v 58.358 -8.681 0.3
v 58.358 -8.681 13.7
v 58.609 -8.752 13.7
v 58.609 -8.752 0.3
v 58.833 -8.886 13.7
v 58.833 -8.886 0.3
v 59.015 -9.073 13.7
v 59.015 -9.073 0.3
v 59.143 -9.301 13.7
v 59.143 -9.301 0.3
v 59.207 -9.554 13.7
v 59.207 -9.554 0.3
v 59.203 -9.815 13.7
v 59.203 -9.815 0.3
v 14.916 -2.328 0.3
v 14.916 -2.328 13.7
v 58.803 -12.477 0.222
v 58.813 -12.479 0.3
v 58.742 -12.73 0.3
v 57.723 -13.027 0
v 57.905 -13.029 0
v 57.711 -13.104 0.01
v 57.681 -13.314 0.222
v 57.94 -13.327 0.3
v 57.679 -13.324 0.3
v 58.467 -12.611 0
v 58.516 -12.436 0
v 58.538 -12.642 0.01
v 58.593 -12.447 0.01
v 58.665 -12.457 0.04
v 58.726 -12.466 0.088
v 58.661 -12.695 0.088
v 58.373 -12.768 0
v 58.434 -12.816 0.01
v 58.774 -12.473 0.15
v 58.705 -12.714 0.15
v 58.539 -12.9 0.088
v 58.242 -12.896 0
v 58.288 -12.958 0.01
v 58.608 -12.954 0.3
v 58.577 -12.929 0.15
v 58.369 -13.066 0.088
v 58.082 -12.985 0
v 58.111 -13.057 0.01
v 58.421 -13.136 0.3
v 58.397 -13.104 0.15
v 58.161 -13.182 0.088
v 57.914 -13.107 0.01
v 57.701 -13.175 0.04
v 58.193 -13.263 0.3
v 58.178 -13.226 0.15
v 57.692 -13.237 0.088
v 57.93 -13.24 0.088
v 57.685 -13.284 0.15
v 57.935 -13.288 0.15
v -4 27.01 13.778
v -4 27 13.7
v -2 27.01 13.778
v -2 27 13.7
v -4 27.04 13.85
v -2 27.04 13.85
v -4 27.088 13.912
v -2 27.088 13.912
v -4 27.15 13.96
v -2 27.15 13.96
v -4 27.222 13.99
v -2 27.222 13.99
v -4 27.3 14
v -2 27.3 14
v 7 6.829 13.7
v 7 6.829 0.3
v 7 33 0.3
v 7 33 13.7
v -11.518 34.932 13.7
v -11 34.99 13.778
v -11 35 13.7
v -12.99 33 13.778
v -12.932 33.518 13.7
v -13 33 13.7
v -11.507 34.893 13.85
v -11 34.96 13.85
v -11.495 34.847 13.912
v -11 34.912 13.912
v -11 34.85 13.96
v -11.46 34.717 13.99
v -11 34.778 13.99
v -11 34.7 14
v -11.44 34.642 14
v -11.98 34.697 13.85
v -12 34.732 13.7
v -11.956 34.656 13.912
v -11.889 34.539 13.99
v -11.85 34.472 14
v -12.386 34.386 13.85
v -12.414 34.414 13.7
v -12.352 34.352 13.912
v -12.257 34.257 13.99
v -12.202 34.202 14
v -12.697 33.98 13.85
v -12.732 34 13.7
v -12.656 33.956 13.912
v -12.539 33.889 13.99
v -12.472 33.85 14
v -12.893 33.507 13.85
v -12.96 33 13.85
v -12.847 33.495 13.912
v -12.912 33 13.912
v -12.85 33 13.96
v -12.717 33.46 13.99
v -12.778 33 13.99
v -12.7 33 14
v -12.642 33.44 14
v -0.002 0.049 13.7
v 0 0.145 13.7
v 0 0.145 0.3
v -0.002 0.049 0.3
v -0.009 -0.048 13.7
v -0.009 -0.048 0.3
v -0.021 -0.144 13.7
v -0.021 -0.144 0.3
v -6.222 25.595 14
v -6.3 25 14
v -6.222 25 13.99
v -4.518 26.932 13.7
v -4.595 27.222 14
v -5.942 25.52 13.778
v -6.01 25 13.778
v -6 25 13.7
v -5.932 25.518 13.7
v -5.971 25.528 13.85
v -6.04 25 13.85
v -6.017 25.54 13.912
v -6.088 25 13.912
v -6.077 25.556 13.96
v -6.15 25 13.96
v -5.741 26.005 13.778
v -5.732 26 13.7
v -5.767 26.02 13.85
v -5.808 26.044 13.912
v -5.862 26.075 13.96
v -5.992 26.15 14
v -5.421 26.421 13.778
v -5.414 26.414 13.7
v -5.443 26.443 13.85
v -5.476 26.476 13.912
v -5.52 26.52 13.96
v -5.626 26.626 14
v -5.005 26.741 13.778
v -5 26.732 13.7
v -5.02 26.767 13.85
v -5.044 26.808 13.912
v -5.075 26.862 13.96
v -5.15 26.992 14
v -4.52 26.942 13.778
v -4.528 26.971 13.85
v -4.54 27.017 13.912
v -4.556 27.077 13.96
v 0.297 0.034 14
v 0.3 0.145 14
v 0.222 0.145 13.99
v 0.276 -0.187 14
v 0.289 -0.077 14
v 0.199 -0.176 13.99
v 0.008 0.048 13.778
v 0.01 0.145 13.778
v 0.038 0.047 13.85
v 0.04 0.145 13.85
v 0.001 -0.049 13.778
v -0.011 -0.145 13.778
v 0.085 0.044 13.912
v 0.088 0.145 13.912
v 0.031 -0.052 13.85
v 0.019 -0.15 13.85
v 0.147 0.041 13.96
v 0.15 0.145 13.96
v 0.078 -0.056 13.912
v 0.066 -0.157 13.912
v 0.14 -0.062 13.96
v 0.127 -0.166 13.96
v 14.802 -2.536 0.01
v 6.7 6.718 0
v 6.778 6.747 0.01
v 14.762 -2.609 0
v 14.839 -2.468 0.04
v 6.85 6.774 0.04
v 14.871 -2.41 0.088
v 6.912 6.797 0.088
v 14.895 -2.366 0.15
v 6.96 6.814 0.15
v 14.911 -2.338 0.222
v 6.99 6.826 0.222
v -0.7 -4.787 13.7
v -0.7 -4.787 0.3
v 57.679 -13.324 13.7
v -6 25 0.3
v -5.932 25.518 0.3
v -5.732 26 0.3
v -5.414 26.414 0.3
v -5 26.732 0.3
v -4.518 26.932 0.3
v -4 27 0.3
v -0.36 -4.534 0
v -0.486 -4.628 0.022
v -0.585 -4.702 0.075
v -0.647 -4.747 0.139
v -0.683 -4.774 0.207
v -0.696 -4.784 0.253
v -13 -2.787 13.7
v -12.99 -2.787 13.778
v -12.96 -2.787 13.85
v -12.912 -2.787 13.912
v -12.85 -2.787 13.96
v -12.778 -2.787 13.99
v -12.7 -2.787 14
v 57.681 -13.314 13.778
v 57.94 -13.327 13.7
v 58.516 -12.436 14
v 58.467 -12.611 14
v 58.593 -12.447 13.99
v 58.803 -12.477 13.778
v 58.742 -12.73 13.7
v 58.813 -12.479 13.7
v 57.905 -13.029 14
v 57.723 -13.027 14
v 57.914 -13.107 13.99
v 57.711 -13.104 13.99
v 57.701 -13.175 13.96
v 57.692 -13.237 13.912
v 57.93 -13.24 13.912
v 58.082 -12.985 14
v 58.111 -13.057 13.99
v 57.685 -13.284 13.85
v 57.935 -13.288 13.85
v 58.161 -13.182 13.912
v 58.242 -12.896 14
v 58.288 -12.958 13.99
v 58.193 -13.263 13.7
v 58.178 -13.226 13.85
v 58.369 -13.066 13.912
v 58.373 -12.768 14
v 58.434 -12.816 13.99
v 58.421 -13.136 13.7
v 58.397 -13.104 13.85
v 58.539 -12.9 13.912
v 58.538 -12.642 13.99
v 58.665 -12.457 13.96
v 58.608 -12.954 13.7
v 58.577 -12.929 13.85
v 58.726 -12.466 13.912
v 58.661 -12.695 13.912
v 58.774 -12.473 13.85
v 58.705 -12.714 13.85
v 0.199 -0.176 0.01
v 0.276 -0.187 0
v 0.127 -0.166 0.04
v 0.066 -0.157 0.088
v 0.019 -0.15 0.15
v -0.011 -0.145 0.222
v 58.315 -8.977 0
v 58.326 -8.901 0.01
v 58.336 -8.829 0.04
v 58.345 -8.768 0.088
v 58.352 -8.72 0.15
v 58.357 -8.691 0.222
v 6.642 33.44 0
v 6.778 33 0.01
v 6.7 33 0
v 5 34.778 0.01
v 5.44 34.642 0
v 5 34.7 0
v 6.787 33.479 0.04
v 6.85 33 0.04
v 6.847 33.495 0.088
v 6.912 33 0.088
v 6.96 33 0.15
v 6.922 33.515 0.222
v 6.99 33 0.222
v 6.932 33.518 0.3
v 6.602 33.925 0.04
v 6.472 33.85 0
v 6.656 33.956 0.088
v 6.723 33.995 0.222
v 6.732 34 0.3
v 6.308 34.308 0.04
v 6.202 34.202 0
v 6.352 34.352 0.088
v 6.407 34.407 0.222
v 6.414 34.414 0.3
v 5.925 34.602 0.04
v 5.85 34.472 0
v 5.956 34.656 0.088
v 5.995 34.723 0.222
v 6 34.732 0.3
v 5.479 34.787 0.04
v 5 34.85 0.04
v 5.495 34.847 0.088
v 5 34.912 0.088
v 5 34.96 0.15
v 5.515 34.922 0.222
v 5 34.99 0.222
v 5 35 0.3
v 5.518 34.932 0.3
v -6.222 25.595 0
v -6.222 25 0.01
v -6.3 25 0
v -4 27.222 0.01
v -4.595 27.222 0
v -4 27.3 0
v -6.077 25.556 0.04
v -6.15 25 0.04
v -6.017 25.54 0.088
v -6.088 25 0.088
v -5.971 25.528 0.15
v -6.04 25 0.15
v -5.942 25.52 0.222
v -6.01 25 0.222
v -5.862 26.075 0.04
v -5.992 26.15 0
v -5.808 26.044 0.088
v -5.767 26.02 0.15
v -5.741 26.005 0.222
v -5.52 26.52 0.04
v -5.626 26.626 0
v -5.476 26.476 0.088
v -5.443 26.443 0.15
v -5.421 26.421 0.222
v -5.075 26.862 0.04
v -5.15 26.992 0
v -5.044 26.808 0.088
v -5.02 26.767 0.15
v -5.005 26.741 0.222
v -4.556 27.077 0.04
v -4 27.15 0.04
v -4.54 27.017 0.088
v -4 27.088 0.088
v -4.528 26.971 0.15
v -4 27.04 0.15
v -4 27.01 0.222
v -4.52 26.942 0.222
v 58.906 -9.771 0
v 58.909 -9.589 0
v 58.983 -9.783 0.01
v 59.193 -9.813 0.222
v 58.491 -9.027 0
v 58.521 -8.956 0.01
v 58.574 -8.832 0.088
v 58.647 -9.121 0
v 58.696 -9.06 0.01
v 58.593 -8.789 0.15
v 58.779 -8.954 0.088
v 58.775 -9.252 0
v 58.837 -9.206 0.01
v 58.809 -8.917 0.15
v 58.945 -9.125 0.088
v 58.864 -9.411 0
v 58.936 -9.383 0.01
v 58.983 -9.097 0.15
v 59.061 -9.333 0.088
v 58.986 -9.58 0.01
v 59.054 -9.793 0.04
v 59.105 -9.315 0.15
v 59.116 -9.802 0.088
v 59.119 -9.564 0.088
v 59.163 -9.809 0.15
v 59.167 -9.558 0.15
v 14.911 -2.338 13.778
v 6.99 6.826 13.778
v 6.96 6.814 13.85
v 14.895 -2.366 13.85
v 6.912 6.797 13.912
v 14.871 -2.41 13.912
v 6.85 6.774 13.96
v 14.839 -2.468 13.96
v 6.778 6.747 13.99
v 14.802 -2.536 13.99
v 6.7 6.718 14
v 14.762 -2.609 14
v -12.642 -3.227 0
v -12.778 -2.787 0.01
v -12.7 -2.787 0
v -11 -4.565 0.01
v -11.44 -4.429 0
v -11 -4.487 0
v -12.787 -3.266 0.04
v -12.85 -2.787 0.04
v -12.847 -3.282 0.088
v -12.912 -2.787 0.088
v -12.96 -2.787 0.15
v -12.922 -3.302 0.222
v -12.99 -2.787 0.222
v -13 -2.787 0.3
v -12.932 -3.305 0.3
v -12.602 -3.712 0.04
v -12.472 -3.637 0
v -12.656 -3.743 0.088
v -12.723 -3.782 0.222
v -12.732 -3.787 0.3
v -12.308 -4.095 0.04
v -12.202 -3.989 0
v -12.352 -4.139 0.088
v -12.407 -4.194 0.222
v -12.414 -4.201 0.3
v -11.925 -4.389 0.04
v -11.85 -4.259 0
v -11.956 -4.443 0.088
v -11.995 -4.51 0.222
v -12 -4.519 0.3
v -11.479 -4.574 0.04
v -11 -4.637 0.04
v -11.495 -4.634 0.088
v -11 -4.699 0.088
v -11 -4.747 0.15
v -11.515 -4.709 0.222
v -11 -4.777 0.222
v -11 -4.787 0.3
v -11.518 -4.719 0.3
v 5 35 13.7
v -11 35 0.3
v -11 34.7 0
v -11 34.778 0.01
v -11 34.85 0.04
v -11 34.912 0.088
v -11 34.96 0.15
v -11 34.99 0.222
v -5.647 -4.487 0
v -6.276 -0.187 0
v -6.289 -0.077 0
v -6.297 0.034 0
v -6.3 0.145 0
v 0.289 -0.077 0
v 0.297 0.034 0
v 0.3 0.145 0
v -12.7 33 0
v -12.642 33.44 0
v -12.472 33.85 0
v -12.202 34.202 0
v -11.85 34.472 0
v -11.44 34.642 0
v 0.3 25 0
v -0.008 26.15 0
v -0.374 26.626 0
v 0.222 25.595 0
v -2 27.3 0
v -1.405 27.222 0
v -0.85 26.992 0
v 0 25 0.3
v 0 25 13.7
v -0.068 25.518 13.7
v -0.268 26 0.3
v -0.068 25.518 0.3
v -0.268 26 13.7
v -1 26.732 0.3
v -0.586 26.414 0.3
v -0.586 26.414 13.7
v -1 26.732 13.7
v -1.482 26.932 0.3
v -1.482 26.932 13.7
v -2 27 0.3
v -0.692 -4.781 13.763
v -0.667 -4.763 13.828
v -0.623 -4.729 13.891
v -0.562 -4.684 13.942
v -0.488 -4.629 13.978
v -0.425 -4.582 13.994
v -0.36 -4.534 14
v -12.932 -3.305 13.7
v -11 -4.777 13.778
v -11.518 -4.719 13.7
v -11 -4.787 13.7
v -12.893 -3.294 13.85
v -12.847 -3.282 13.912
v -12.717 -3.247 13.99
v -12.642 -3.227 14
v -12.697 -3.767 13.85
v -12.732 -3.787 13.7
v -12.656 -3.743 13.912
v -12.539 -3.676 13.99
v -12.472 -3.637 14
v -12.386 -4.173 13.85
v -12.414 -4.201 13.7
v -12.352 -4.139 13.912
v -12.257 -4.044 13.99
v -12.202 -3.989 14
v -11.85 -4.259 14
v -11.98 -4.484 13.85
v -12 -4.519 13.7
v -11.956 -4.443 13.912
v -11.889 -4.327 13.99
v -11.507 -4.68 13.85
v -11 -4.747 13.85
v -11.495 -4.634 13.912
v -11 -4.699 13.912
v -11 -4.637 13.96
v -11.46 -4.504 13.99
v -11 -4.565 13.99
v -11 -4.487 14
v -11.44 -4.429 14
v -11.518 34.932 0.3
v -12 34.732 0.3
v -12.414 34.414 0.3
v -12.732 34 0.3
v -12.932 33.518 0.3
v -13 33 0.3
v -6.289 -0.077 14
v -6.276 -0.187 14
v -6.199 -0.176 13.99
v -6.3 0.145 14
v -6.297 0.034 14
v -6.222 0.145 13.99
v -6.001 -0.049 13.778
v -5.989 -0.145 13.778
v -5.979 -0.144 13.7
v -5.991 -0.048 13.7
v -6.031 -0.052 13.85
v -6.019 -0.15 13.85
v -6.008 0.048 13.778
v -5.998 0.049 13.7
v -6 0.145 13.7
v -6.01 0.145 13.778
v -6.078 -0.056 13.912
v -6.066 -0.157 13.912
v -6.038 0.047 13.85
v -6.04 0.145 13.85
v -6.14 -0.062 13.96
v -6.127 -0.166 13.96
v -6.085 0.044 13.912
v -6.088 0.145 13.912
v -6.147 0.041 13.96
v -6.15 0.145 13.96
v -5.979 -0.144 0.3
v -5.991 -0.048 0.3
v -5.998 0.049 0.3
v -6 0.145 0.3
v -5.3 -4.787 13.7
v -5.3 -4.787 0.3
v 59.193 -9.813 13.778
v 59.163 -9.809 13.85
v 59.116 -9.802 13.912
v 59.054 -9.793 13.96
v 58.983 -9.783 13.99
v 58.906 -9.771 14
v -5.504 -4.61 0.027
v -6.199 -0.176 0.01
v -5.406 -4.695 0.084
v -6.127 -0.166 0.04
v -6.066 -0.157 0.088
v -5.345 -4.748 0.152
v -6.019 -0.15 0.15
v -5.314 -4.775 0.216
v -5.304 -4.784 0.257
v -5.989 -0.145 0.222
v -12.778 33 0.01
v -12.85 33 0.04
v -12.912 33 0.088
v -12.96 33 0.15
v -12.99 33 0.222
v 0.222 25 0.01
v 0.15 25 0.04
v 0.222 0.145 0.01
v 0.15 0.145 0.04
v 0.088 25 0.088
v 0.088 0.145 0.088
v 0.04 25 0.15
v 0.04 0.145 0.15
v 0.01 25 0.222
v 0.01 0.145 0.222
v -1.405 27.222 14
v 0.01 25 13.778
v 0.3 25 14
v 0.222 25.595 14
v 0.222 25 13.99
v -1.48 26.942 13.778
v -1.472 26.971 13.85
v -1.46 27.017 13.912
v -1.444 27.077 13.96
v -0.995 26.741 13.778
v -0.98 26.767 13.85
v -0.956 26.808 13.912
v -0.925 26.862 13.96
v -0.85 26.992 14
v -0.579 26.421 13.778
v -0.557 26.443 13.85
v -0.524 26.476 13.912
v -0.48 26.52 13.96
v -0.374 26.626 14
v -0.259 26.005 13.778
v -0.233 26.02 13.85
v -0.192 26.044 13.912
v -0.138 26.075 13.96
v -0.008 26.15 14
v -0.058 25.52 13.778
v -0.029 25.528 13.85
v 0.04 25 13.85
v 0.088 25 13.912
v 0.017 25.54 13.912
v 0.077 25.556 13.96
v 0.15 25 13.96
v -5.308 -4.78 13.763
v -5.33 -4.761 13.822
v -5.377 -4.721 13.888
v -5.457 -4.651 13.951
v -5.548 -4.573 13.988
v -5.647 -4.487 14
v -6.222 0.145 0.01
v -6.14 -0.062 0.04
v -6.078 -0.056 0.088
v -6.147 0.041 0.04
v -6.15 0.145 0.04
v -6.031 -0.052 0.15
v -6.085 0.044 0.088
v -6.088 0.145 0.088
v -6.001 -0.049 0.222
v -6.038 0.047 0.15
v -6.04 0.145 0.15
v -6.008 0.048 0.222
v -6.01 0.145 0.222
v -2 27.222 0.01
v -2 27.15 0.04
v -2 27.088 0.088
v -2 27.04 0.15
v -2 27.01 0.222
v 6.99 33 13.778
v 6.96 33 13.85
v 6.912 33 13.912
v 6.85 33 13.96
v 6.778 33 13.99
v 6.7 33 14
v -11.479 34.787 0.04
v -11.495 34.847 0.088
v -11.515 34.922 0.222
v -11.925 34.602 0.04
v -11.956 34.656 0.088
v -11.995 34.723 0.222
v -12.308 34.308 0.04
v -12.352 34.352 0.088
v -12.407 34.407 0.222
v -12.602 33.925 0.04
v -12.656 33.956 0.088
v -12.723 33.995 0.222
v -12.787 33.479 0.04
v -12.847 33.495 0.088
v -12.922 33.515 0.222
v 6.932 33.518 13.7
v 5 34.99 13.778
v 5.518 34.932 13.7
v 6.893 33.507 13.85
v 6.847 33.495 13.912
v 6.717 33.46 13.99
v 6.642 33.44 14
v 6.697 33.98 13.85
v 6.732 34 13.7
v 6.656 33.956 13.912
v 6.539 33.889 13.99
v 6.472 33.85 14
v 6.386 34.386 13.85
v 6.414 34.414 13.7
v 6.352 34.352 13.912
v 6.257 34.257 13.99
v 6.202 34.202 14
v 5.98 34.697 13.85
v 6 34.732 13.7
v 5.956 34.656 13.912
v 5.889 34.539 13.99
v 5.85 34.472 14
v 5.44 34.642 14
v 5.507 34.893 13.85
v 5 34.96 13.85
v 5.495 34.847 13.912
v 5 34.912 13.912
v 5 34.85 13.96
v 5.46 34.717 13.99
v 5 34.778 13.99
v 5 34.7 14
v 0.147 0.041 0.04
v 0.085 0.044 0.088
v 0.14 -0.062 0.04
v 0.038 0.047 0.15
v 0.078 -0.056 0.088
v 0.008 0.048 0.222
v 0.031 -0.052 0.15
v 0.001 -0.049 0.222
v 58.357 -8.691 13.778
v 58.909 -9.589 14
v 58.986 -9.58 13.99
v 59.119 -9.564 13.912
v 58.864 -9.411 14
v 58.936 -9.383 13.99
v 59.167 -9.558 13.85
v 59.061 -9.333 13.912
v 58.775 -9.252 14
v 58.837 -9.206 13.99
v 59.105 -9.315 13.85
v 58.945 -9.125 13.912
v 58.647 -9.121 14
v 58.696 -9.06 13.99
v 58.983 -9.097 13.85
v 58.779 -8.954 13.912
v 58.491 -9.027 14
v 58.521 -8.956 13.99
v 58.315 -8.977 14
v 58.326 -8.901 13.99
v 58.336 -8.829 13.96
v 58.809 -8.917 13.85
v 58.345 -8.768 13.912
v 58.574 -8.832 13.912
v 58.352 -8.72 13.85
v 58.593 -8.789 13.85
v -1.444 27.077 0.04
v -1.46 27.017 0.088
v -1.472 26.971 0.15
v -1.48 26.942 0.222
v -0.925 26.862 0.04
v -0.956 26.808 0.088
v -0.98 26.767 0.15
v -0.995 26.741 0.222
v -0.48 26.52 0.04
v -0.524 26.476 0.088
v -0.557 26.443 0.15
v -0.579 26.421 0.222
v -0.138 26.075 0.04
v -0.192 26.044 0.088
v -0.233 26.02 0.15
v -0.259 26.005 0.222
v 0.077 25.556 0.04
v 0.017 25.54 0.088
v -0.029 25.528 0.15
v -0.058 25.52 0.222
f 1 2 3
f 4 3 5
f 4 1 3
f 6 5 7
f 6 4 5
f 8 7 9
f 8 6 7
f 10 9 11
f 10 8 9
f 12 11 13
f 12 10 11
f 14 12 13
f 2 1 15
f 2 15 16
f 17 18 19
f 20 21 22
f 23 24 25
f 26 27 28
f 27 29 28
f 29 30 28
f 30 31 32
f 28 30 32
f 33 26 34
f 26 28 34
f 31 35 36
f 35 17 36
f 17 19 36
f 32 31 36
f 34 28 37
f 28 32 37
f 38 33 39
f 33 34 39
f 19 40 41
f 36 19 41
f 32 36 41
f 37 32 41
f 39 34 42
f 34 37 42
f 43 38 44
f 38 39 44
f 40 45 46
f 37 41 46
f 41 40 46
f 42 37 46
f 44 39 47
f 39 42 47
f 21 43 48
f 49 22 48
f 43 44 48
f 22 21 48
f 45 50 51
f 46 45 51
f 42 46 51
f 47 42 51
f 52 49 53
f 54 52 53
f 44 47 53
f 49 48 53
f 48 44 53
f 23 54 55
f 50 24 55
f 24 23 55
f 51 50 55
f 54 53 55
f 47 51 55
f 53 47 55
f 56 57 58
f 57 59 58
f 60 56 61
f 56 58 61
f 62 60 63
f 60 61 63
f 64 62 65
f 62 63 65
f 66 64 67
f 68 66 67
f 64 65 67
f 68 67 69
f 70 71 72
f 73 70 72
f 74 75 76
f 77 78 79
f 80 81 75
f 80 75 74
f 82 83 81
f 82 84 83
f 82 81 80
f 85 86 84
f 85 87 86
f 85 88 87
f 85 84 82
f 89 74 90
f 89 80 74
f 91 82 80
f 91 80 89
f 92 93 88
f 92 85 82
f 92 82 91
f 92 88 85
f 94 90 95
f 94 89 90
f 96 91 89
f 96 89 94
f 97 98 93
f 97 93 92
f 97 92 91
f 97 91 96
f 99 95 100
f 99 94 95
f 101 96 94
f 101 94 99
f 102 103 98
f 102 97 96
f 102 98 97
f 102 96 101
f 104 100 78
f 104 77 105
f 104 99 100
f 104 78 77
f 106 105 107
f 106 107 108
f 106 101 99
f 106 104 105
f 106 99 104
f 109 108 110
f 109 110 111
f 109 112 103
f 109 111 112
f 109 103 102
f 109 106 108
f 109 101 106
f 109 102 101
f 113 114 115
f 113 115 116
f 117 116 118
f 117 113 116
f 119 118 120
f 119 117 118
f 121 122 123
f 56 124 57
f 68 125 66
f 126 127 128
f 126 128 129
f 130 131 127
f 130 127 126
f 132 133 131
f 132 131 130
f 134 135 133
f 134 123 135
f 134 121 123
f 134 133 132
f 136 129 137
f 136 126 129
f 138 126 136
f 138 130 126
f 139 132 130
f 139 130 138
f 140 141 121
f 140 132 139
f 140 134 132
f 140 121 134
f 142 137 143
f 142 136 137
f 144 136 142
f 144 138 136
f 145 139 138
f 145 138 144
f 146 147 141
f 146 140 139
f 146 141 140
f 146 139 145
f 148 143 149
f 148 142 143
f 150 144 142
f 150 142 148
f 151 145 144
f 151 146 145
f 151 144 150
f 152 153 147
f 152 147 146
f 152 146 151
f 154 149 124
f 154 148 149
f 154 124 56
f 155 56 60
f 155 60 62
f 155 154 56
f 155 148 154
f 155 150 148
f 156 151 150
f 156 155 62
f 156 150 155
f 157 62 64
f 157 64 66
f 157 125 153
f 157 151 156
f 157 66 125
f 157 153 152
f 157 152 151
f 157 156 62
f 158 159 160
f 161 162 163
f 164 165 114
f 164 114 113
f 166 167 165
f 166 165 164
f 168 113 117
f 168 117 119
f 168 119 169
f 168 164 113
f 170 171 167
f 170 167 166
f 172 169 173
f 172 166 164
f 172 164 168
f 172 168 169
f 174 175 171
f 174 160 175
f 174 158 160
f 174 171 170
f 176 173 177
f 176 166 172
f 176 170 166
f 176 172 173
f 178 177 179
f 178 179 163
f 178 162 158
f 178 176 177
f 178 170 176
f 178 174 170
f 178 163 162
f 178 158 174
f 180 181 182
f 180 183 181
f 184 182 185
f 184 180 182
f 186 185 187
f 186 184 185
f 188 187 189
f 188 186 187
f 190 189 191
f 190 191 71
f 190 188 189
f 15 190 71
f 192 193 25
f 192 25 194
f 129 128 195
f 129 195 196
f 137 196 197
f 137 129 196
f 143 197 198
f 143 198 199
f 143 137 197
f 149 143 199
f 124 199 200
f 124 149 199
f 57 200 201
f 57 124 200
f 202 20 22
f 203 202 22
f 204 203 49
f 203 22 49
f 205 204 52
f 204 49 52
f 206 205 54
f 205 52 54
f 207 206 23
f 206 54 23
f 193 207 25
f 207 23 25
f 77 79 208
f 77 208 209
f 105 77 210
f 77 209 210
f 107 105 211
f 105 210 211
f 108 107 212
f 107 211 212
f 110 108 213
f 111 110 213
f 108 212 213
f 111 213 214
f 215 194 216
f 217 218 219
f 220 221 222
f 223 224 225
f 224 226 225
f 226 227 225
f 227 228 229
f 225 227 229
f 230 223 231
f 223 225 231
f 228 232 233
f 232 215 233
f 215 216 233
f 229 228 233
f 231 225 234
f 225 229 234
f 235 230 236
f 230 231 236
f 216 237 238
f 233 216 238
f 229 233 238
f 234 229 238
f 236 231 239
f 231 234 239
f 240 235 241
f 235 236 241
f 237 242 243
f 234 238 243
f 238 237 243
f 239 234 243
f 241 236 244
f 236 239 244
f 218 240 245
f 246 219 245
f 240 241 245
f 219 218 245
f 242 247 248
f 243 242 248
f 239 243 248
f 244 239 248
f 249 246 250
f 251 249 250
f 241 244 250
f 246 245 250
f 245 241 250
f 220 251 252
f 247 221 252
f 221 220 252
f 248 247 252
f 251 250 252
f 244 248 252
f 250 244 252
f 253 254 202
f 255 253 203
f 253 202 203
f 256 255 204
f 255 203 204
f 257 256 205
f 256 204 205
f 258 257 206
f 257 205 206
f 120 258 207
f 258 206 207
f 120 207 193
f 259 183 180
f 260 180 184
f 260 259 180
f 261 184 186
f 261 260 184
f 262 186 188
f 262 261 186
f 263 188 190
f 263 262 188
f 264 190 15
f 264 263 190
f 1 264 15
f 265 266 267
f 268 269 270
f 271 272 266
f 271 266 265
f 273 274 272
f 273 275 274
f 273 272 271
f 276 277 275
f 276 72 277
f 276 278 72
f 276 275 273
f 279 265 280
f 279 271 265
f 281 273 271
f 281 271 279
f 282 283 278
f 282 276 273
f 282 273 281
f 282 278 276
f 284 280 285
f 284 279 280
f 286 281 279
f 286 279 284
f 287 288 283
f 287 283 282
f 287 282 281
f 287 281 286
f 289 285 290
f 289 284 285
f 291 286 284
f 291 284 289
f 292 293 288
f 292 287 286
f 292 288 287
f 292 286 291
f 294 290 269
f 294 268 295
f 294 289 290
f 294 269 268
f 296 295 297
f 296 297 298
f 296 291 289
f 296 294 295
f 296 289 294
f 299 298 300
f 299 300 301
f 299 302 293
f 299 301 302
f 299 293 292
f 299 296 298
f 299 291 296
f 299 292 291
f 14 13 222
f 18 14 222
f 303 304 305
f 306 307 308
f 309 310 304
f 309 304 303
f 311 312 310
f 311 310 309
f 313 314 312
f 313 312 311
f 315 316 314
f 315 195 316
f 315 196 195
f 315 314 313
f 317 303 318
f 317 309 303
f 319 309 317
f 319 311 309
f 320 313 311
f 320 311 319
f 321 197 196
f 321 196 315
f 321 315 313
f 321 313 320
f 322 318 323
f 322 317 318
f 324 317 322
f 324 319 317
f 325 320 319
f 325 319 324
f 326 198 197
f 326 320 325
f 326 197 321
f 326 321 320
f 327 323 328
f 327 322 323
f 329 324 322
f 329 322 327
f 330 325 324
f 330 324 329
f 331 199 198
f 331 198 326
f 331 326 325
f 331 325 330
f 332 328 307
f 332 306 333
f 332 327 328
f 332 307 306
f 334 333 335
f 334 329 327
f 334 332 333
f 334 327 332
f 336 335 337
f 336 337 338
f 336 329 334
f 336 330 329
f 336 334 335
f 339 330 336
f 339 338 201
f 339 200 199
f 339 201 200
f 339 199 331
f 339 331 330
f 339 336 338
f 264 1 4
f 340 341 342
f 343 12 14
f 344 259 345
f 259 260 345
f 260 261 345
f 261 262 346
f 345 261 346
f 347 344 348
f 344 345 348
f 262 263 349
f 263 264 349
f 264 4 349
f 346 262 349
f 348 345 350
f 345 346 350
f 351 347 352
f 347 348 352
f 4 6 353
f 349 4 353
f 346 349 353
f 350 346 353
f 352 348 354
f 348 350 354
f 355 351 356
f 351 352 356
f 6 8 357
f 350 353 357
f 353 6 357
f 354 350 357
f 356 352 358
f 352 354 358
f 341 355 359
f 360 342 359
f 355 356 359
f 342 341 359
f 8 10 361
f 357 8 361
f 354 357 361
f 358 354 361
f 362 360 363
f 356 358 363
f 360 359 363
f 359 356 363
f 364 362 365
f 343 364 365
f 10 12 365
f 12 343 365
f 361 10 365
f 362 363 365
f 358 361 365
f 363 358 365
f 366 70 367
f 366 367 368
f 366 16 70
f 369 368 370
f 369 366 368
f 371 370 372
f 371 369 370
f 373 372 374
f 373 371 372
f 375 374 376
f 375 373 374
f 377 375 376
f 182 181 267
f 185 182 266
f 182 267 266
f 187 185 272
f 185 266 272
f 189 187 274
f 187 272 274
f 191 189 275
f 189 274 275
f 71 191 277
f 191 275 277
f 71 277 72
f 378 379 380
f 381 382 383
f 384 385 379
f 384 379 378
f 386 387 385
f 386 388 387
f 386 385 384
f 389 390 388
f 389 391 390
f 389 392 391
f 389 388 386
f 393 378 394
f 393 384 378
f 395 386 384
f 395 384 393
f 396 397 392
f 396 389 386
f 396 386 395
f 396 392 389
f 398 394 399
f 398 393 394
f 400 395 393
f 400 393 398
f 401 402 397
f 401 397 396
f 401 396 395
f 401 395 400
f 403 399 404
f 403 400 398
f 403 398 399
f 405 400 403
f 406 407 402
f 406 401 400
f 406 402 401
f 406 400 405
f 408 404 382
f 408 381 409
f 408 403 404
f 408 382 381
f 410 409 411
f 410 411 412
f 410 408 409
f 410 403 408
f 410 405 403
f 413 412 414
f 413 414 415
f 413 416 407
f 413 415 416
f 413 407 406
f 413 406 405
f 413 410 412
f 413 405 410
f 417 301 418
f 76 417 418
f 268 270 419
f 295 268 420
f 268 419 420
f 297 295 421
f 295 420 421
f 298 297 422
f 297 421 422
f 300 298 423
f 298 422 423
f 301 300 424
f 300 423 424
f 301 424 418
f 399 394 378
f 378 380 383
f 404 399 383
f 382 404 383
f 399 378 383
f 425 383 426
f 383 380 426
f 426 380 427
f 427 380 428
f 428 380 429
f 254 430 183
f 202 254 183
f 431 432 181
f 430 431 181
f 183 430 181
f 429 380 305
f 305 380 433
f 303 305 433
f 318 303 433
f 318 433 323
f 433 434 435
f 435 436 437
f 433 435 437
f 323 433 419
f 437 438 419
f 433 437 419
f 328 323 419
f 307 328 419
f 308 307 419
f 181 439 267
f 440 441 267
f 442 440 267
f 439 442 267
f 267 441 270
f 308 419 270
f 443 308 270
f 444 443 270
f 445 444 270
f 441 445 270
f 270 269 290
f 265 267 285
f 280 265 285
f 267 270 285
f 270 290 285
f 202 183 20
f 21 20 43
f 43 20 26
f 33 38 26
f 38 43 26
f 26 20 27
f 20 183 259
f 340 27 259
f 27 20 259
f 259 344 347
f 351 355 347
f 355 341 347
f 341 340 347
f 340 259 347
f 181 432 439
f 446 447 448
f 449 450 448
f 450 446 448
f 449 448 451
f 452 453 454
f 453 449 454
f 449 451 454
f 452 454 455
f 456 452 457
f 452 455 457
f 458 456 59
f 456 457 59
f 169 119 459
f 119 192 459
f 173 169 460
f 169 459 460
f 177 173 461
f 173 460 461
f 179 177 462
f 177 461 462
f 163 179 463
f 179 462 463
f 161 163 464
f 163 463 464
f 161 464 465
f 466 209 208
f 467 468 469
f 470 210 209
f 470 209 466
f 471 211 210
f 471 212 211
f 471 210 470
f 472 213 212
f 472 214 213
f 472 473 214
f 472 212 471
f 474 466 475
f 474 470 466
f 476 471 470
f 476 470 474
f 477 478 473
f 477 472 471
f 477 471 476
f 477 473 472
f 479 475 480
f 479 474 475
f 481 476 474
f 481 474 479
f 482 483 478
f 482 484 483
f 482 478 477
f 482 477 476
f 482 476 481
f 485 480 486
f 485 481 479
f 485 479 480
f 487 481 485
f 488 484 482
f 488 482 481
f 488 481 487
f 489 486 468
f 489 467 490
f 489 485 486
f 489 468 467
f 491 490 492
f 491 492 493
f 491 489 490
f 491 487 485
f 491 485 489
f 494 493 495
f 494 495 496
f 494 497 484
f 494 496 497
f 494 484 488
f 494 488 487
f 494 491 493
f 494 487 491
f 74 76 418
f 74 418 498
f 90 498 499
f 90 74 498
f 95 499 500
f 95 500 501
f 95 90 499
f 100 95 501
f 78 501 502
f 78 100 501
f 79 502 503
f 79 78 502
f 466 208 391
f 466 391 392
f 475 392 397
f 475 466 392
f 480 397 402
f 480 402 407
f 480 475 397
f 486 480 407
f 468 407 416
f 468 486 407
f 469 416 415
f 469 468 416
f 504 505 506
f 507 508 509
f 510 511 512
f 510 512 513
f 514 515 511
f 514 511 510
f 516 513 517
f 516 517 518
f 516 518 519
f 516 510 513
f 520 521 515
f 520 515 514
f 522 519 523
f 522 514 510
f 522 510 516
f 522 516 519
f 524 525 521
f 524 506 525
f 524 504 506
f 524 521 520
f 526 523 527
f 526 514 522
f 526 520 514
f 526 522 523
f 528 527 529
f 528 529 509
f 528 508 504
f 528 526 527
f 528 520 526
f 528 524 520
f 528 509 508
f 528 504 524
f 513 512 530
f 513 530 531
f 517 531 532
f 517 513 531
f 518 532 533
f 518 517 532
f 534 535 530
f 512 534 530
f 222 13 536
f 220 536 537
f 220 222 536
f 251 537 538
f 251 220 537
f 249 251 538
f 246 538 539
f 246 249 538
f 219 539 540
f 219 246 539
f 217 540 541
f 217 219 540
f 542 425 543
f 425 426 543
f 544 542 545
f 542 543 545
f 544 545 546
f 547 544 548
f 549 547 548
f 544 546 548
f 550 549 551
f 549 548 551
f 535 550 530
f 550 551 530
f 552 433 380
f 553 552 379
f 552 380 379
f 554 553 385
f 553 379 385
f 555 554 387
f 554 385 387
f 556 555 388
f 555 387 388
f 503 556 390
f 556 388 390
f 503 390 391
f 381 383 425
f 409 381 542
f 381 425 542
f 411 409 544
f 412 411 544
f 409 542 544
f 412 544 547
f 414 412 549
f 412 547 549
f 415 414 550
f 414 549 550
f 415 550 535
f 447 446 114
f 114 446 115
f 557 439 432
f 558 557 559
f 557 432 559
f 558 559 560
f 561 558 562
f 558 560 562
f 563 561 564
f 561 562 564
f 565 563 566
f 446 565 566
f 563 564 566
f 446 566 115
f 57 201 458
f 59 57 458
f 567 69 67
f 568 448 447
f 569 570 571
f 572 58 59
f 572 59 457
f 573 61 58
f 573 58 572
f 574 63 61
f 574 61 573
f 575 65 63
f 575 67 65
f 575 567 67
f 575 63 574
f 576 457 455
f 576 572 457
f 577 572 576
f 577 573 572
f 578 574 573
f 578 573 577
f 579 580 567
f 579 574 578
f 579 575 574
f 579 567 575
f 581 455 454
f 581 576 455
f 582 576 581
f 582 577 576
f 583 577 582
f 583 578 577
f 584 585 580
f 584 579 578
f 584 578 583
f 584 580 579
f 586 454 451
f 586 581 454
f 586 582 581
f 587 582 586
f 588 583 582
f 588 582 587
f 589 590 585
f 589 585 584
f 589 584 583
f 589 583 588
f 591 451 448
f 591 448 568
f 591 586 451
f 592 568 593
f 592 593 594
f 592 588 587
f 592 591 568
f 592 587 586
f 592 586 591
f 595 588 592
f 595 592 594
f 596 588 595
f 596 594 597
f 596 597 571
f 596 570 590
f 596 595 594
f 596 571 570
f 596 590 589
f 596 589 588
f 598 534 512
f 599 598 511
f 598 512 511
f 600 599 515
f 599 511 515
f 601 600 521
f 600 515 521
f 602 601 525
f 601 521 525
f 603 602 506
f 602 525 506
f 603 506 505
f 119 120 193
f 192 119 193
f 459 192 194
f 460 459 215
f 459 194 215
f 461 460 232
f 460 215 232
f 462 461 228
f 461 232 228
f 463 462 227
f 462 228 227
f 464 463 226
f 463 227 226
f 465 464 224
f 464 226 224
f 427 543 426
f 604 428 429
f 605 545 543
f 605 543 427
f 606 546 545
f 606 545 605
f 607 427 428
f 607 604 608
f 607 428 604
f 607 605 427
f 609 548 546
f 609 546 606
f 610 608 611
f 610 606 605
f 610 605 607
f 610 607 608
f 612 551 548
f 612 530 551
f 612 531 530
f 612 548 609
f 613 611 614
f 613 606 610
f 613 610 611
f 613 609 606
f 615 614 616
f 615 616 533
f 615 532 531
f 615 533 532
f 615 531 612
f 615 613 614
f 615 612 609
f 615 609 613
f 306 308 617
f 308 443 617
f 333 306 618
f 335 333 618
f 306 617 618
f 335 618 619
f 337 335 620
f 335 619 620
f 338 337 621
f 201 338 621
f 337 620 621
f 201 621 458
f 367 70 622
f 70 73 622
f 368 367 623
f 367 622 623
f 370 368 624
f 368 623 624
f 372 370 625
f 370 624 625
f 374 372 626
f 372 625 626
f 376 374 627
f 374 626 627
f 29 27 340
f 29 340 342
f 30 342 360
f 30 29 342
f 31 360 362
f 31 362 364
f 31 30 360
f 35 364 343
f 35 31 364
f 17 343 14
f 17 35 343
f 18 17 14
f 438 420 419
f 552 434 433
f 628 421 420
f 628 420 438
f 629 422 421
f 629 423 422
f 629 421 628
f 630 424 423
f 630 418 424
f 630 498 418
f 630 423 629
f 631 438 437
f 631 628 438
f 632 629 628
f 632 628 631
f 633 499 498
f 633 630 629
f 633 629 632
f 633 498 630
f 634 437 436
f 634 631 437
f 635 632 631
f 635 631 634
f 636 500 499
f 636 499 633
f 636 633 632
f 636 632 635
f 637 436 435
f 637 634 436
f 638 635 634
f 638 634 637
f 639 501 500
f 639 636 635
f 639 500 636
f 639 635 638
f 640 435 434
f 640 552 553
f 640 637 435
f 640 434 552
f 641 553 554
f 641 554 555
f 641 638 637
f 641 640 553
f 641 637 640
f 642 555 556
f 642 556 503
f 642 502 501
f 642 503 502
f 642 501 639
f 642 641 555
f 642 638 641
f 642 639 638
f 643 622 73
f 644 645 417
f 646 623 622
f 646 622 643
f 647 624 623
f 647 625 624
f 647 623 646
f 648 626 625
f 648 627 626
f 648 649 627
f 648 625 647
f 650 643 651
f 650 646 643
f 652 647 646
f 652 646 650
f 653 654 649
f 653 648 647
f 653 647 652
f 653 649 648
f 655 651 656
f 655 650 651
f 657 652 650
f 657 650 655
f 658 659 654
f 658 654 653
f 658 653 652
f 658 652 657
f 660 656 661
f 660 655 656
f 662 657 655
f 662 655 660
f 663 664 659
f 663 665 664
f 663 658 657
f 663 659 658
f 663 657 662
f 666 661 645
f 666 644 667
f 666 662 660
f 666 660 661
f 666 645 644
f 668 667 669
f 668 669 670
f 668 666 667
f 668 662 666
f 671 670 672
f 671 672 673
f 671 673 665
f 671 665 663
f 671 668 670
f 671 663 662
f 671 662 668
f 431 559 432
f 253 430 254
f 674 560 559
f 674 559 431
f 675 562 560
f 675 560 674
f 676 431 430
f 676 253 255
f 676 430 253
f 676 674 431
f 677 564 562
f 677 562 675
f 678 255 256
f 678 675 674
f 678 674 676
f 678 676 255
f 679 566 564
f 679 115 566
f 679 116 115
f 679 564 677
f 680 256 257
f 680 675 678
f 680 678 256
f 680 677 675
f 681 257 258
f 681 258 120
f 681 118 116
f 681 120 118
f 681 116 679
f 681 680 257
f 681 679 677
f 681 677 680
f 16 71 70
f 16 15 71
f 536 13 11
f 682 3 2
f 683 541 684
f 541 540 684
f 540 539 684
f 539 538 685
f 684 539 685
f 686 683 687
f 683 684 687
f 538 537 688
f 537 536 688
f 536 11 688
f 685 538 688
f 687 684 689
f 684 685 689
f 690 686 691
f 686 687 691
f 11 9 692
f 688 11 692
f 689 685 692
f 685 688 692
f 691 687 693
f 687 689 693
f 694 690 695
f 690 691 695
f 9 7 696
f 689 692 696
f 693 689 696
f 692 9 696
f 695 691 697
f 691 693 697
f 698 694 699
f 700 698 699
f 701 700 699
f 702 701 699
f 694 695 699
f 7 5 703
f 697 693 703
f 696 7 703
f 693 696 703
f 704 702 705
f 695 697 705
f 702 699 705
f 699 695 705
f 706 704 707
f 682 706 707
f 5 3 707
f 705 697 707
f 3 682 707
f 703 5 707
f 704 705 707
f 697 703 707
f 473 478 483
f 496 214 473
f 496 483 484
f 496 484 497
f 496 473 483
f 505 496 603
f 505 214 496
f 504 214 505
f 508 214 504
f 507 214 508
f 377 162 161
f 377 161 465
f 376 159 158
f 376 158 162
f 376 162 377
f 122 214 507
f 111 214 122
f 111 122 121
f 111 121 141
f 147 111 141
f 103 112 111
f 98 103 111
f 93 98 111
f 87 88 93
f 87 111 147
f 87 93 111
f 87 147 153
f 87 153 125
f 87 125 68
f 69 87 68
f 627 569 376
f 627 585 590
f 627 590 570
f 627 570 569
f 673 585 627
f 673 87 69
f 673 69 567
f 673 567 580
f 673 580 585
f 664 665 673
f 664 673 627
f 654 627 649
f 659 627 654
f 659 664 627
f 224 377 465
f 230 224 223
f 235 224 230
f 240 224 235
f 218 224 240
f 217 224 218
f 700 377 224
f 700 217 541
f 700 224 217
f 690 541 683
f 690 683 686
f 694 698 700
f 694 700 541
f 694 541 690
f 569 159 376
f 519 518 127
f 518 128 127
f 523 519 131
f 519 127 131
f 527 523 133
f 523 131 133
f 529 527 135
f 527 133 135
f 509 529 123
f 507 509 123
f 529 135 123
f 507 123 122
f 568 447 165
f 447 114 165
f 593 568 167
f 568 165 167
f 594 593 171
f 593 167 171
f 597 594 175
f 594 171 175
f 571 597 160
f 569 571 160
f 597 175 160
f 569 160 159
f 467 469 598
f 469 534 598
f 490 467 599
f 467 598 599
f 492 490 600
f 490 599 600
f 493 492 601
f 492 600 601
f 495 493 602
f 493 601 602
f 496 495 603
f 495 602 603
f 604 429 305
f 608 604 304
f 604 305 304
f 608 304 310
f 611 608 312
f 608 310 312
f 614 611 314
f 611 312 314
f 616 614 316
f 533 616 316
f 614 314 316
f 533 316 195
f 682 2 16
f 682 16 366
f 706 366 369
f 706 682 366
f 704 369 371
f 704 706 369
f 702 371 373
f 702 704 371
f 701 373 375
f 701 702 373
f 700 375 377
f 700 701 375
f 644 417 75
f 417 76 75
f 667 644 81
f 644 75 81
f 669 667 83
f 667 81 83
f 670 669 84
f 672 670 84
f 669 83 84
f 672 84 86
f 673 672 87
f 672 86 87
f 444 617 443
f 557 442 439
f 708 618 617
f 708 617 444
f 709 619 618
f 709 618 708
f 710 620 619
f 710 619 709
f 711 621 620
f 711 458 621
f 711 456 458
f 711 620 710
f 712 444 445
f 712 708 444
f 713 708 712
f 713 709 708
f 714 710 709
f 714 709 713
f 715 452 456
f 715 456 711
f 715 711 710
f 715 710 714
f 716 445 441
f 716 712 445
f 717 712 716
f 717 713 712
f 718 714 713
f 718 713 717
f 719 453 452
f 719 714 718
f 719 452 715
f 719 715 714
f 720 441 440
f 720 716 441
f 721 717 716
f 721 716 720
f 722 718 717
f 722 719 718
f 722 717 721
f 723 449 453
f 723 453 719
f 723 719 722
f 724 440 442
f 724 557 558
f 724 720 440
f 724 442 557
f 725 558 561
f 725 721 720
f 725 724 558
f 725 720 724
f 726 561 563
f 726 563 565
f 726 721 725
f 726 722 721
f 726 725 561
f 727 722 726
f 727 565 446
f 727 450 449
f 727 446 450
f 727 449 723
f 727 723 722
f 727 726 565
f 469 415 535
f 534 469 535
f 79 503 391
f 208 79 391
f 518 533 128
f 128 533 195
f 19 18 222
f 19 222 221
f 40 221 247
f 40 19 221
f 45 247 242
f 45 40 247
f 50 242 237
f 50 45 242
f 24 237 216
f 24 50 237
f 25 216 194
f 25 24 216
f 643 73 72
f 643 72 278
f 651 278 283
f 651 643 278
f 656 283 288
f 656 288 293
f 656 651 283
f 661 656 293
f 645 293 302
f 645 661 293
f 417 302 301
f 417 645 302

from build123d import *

# Parameters (mm, degrees)
F1_DEPTH     = 14
F2_R         = 2
F3_W         = 4.692493906
F3_H         = 14
F4_DEPTH     = 60
F5_SIZE      = 8
F6_R         = 0.3
F7_T1_DEPTH  = 14
F7_T4_ANGLE  = 90
F7_T6_ANGLE  = 90
F7_T8_ANGLE  = 90
F7_T10_ANGLE = 90


# Not quite as in the source:
# - a fillet or chamfer that OpenCascade refuses, or shapes differently, is made with other operations: its cross-section is extruded or revolved along the edge and cut away or added
# - a feature names something its author has since deleted; it is built from what else it names


with BuildPart() as f1:
    # F0 (on Top) → F1 (new body)
    with BuildSketch(Plane.XY):
        Polygon((0, 27), (0, 0), (-0.7, -4.7870394774), (7, -4.7870394774), (7, 35), (-13, 35), (-13, -4.7870394774), (-5.3, -4.7870394774), (-6, 0), (-6, 27), align=None)
    extrude(amount=F1_DEPTH)

    # F2
    f2_edges = [f1.edges().sort_by_distance(p)[0] for p in [
        (-13, 35, 7),
        (-13, -4.787039, 7),
        (0, 27, 7),
        (0, 0, 7),
        (7, 35, 7),
        (-6, 0, 7),
        (-6, 27, 7),
    ]]
    fillet(f2_edges, radius=F2_R)

    # F3 (on face) → F4 (join)
    with BuildSketch(Plane(origin=(0, 0, 0), x_dir=(-0.1446894238, -0.9894771198, 0), z_dir=(-0.9894771198, 0.1446894238, 0))):
        with Locations((2.4917016782, 7)):
            Rectangle(F3_W, F3_H)
    extrude(amount=-F4_DEPTH)

    # F5
    f5_edges = [f1.edges().sort_by_distance(p)[0] for p in [
        (7, -1.170599, 7),
    ]]
    chamfer(f5_edges, length=F5_SIZE)

    # F6
    f6_edges = [f1.edges().sort_by_distance(p)[0] for p in [
        (37.131699, -5.576702, 14),
        (10.957908, 2.250644, 14),
        (59.008104, -11.146847, 14),
        (7, 19.914701, 14),
        (28.984314, -9.127722, 14),
        (6.414214, 34.414214, 14),
        (-0.360523, -2.465482, 14),
        (-3, 35, 14),
        (-0.005268, 0.000383, 14),
        (-12.414214, 34.414214, 14),
        (0, 12.572727, 14),
        (-13, 15.10648, 14),
        (-0.585786, 26.414214, 14),
        (-12.414214, -4.201253, 14),
        (-3, 27, 14),
        (-8.15, -4.787039, 14),
        (-5.414214, 26.414214, 14),
        (-5.639477, -2.465482, 14),
        (-6, 12.572727, 14),
        (-5.994732, 0.000383, 14),
        (37.131699, -5.576702, 0),
        (10.957908, 2.250644, 0),
        (59.008104, -11.146847, 0),
        (7, 19.914701, 0),
        (28.984314, -9.127722, 0),
        (6.414214, 34.414214, 0),
        (-0.360523, -2.465482, 0),
        (-3, 35, 0),
        (-0.005268, 0.000383, 0),
        (-12.414214, 34.414214, 0),
        (0, 12.572727, 0),
        (-13, 15.10648, 0),
        (-0.585786, 26.414214, 0),
        (-12.414214, -4.201253, 0),
        (-3, 27, 0),
        (-8.15, -4.787039, 0),
        (-5.414214, 26.414214, 0),
        (-5.639477, -2.465482, 0),
        (-6, 12.572727, 0),
        (-5.994732, 0.000383, 0),
    ]]
    fillet(f6_edges, radius=F6_R)

    # F7: fillet of radius 1 on 2 edges, made by hand

    # F7_s2 → F7_t1 (cut)
    with BuildSketch(Plane.XY):
        with BuildLine():
            ThreePointArc((58.3581043085, -8.6806001289), (59.0153917386, -9.0727221402), (59.2028920045, -9.8147666726))
            Line((59.2028920045, -9.8147666726), (59.3475814283, -8.8252895527))
            Line((59.3475814283, -8.8252895527), (58.3581043085, -8.6806001289))
        make_face()
        with BuildLine():
            ThreePointArc((58.8133166125, -12.4789277878), (58.4211946012, -13.136215218), (57.6791500689, -13.3237154838))
            Line((57.6791500689, -13.3237154838), (58.6686271887, -13.4684049076))
            Line((58.6686271887, -13.4684049076), (58.8133166125, -12.4789277878))
        make_face()
    extrude(amount=F7_T1_DEPTH, mode=Mode.SUBTRACT)

    # F7_s3 → F7_t4 (revolve, cut)
    with BuildSketch(Plane(origin=(-0.5553105762, -3.7975623576, 0), x_dir=(0, 0, 1), z_dir=(0.1446894238, 0.9894771198, 0))):
        with BuildLine():
            ThreePointArc((0, 59.7), (0.0878679656, 59.9121320344), (0.3, 60))
            Line((0.3, 60), (0, 60))
            Line((0, 60), (0, 59.7))
        make_face()
    revolve(axis=Axis((57.8238394927, -12.334238364, 0), (0, 0, -1)), revolution_arc=F7_T4_ANGLE, mode=Mode.SUBTRACT)

    # F7_s5 → F7_t6 (revolve, cut)
    with BuildSketch(Plane(origin=(58.3791500689, -8.5366760064, 0), x_dir=(0, 0, 1), z_dir=(-0.9894771198, 0.1446894238, 0))):
        with BuildLine():
            ThreePointArc((14, -4.5379486312), (13.9121320344, -4.7500806655), (13.7, -4.8379486312))
            Line((13.7, -4.8379486312), (14, -4.8379486312))
            Line((14, -4.8379486312), (14, -4.5379486312))
        make_face()
    revolve(axis=Axis((57.8238394927, -12.334238364, 14), (0, 0, 1)), revolution_arc=F7_T6_ANGLE, mode=Mode.SUBTRACT)

    # F7_s7 → F7_t8 (revolve, cut)
    with BuildSketch(Plane(origin=(-0.1657351842, -1.1334012423, 0), x_dir=(0, 0, 1), z_dir=(-0.1446894238, -0.9894771198, 0))):
        with BuildLine():
            ThreePointArc((14, -59.7), (13.9121320344, -59.9121320344), (13.7, -60))
            Line((13.7, -60), (14, -60))
            Line((14, -60), (14, -59.7))
        make_face()
    revolve(axis=Axis((58.2134148846, -9.6700772487, 14), (0, 0, 1)), revolution_arc=F7_T8_ANGLE, mode=Mode.SUBTRACT)

    # F7_s9 → F7_t10 (revolve, cut)
    with BuildSketch(Plane(origin=(58.3791500689, -8.5366760064, 0), x_dir=(0, 0, 1), z_dir=(-0.9894771198, 0.1446894238, 0))):
        with BuildLine():
            ThreePointArc((0, -0.4454547252), (0.0878679656, -0.2333226908), (0.3, -0.1454547252))
            Line((0.3, -0.1454547252), (0, -0.1454547252))
            Line((0, -0.1454547252), (0, -0.4454547252))
        make_face()
    revolve(axis=Axis((58.2134148846, -9.6700772487, 0), (0, 0, -1)), revolution_arc=F7_T10_ANGLE, mode=Mode.SUBTRACT)


solid = f1.part
